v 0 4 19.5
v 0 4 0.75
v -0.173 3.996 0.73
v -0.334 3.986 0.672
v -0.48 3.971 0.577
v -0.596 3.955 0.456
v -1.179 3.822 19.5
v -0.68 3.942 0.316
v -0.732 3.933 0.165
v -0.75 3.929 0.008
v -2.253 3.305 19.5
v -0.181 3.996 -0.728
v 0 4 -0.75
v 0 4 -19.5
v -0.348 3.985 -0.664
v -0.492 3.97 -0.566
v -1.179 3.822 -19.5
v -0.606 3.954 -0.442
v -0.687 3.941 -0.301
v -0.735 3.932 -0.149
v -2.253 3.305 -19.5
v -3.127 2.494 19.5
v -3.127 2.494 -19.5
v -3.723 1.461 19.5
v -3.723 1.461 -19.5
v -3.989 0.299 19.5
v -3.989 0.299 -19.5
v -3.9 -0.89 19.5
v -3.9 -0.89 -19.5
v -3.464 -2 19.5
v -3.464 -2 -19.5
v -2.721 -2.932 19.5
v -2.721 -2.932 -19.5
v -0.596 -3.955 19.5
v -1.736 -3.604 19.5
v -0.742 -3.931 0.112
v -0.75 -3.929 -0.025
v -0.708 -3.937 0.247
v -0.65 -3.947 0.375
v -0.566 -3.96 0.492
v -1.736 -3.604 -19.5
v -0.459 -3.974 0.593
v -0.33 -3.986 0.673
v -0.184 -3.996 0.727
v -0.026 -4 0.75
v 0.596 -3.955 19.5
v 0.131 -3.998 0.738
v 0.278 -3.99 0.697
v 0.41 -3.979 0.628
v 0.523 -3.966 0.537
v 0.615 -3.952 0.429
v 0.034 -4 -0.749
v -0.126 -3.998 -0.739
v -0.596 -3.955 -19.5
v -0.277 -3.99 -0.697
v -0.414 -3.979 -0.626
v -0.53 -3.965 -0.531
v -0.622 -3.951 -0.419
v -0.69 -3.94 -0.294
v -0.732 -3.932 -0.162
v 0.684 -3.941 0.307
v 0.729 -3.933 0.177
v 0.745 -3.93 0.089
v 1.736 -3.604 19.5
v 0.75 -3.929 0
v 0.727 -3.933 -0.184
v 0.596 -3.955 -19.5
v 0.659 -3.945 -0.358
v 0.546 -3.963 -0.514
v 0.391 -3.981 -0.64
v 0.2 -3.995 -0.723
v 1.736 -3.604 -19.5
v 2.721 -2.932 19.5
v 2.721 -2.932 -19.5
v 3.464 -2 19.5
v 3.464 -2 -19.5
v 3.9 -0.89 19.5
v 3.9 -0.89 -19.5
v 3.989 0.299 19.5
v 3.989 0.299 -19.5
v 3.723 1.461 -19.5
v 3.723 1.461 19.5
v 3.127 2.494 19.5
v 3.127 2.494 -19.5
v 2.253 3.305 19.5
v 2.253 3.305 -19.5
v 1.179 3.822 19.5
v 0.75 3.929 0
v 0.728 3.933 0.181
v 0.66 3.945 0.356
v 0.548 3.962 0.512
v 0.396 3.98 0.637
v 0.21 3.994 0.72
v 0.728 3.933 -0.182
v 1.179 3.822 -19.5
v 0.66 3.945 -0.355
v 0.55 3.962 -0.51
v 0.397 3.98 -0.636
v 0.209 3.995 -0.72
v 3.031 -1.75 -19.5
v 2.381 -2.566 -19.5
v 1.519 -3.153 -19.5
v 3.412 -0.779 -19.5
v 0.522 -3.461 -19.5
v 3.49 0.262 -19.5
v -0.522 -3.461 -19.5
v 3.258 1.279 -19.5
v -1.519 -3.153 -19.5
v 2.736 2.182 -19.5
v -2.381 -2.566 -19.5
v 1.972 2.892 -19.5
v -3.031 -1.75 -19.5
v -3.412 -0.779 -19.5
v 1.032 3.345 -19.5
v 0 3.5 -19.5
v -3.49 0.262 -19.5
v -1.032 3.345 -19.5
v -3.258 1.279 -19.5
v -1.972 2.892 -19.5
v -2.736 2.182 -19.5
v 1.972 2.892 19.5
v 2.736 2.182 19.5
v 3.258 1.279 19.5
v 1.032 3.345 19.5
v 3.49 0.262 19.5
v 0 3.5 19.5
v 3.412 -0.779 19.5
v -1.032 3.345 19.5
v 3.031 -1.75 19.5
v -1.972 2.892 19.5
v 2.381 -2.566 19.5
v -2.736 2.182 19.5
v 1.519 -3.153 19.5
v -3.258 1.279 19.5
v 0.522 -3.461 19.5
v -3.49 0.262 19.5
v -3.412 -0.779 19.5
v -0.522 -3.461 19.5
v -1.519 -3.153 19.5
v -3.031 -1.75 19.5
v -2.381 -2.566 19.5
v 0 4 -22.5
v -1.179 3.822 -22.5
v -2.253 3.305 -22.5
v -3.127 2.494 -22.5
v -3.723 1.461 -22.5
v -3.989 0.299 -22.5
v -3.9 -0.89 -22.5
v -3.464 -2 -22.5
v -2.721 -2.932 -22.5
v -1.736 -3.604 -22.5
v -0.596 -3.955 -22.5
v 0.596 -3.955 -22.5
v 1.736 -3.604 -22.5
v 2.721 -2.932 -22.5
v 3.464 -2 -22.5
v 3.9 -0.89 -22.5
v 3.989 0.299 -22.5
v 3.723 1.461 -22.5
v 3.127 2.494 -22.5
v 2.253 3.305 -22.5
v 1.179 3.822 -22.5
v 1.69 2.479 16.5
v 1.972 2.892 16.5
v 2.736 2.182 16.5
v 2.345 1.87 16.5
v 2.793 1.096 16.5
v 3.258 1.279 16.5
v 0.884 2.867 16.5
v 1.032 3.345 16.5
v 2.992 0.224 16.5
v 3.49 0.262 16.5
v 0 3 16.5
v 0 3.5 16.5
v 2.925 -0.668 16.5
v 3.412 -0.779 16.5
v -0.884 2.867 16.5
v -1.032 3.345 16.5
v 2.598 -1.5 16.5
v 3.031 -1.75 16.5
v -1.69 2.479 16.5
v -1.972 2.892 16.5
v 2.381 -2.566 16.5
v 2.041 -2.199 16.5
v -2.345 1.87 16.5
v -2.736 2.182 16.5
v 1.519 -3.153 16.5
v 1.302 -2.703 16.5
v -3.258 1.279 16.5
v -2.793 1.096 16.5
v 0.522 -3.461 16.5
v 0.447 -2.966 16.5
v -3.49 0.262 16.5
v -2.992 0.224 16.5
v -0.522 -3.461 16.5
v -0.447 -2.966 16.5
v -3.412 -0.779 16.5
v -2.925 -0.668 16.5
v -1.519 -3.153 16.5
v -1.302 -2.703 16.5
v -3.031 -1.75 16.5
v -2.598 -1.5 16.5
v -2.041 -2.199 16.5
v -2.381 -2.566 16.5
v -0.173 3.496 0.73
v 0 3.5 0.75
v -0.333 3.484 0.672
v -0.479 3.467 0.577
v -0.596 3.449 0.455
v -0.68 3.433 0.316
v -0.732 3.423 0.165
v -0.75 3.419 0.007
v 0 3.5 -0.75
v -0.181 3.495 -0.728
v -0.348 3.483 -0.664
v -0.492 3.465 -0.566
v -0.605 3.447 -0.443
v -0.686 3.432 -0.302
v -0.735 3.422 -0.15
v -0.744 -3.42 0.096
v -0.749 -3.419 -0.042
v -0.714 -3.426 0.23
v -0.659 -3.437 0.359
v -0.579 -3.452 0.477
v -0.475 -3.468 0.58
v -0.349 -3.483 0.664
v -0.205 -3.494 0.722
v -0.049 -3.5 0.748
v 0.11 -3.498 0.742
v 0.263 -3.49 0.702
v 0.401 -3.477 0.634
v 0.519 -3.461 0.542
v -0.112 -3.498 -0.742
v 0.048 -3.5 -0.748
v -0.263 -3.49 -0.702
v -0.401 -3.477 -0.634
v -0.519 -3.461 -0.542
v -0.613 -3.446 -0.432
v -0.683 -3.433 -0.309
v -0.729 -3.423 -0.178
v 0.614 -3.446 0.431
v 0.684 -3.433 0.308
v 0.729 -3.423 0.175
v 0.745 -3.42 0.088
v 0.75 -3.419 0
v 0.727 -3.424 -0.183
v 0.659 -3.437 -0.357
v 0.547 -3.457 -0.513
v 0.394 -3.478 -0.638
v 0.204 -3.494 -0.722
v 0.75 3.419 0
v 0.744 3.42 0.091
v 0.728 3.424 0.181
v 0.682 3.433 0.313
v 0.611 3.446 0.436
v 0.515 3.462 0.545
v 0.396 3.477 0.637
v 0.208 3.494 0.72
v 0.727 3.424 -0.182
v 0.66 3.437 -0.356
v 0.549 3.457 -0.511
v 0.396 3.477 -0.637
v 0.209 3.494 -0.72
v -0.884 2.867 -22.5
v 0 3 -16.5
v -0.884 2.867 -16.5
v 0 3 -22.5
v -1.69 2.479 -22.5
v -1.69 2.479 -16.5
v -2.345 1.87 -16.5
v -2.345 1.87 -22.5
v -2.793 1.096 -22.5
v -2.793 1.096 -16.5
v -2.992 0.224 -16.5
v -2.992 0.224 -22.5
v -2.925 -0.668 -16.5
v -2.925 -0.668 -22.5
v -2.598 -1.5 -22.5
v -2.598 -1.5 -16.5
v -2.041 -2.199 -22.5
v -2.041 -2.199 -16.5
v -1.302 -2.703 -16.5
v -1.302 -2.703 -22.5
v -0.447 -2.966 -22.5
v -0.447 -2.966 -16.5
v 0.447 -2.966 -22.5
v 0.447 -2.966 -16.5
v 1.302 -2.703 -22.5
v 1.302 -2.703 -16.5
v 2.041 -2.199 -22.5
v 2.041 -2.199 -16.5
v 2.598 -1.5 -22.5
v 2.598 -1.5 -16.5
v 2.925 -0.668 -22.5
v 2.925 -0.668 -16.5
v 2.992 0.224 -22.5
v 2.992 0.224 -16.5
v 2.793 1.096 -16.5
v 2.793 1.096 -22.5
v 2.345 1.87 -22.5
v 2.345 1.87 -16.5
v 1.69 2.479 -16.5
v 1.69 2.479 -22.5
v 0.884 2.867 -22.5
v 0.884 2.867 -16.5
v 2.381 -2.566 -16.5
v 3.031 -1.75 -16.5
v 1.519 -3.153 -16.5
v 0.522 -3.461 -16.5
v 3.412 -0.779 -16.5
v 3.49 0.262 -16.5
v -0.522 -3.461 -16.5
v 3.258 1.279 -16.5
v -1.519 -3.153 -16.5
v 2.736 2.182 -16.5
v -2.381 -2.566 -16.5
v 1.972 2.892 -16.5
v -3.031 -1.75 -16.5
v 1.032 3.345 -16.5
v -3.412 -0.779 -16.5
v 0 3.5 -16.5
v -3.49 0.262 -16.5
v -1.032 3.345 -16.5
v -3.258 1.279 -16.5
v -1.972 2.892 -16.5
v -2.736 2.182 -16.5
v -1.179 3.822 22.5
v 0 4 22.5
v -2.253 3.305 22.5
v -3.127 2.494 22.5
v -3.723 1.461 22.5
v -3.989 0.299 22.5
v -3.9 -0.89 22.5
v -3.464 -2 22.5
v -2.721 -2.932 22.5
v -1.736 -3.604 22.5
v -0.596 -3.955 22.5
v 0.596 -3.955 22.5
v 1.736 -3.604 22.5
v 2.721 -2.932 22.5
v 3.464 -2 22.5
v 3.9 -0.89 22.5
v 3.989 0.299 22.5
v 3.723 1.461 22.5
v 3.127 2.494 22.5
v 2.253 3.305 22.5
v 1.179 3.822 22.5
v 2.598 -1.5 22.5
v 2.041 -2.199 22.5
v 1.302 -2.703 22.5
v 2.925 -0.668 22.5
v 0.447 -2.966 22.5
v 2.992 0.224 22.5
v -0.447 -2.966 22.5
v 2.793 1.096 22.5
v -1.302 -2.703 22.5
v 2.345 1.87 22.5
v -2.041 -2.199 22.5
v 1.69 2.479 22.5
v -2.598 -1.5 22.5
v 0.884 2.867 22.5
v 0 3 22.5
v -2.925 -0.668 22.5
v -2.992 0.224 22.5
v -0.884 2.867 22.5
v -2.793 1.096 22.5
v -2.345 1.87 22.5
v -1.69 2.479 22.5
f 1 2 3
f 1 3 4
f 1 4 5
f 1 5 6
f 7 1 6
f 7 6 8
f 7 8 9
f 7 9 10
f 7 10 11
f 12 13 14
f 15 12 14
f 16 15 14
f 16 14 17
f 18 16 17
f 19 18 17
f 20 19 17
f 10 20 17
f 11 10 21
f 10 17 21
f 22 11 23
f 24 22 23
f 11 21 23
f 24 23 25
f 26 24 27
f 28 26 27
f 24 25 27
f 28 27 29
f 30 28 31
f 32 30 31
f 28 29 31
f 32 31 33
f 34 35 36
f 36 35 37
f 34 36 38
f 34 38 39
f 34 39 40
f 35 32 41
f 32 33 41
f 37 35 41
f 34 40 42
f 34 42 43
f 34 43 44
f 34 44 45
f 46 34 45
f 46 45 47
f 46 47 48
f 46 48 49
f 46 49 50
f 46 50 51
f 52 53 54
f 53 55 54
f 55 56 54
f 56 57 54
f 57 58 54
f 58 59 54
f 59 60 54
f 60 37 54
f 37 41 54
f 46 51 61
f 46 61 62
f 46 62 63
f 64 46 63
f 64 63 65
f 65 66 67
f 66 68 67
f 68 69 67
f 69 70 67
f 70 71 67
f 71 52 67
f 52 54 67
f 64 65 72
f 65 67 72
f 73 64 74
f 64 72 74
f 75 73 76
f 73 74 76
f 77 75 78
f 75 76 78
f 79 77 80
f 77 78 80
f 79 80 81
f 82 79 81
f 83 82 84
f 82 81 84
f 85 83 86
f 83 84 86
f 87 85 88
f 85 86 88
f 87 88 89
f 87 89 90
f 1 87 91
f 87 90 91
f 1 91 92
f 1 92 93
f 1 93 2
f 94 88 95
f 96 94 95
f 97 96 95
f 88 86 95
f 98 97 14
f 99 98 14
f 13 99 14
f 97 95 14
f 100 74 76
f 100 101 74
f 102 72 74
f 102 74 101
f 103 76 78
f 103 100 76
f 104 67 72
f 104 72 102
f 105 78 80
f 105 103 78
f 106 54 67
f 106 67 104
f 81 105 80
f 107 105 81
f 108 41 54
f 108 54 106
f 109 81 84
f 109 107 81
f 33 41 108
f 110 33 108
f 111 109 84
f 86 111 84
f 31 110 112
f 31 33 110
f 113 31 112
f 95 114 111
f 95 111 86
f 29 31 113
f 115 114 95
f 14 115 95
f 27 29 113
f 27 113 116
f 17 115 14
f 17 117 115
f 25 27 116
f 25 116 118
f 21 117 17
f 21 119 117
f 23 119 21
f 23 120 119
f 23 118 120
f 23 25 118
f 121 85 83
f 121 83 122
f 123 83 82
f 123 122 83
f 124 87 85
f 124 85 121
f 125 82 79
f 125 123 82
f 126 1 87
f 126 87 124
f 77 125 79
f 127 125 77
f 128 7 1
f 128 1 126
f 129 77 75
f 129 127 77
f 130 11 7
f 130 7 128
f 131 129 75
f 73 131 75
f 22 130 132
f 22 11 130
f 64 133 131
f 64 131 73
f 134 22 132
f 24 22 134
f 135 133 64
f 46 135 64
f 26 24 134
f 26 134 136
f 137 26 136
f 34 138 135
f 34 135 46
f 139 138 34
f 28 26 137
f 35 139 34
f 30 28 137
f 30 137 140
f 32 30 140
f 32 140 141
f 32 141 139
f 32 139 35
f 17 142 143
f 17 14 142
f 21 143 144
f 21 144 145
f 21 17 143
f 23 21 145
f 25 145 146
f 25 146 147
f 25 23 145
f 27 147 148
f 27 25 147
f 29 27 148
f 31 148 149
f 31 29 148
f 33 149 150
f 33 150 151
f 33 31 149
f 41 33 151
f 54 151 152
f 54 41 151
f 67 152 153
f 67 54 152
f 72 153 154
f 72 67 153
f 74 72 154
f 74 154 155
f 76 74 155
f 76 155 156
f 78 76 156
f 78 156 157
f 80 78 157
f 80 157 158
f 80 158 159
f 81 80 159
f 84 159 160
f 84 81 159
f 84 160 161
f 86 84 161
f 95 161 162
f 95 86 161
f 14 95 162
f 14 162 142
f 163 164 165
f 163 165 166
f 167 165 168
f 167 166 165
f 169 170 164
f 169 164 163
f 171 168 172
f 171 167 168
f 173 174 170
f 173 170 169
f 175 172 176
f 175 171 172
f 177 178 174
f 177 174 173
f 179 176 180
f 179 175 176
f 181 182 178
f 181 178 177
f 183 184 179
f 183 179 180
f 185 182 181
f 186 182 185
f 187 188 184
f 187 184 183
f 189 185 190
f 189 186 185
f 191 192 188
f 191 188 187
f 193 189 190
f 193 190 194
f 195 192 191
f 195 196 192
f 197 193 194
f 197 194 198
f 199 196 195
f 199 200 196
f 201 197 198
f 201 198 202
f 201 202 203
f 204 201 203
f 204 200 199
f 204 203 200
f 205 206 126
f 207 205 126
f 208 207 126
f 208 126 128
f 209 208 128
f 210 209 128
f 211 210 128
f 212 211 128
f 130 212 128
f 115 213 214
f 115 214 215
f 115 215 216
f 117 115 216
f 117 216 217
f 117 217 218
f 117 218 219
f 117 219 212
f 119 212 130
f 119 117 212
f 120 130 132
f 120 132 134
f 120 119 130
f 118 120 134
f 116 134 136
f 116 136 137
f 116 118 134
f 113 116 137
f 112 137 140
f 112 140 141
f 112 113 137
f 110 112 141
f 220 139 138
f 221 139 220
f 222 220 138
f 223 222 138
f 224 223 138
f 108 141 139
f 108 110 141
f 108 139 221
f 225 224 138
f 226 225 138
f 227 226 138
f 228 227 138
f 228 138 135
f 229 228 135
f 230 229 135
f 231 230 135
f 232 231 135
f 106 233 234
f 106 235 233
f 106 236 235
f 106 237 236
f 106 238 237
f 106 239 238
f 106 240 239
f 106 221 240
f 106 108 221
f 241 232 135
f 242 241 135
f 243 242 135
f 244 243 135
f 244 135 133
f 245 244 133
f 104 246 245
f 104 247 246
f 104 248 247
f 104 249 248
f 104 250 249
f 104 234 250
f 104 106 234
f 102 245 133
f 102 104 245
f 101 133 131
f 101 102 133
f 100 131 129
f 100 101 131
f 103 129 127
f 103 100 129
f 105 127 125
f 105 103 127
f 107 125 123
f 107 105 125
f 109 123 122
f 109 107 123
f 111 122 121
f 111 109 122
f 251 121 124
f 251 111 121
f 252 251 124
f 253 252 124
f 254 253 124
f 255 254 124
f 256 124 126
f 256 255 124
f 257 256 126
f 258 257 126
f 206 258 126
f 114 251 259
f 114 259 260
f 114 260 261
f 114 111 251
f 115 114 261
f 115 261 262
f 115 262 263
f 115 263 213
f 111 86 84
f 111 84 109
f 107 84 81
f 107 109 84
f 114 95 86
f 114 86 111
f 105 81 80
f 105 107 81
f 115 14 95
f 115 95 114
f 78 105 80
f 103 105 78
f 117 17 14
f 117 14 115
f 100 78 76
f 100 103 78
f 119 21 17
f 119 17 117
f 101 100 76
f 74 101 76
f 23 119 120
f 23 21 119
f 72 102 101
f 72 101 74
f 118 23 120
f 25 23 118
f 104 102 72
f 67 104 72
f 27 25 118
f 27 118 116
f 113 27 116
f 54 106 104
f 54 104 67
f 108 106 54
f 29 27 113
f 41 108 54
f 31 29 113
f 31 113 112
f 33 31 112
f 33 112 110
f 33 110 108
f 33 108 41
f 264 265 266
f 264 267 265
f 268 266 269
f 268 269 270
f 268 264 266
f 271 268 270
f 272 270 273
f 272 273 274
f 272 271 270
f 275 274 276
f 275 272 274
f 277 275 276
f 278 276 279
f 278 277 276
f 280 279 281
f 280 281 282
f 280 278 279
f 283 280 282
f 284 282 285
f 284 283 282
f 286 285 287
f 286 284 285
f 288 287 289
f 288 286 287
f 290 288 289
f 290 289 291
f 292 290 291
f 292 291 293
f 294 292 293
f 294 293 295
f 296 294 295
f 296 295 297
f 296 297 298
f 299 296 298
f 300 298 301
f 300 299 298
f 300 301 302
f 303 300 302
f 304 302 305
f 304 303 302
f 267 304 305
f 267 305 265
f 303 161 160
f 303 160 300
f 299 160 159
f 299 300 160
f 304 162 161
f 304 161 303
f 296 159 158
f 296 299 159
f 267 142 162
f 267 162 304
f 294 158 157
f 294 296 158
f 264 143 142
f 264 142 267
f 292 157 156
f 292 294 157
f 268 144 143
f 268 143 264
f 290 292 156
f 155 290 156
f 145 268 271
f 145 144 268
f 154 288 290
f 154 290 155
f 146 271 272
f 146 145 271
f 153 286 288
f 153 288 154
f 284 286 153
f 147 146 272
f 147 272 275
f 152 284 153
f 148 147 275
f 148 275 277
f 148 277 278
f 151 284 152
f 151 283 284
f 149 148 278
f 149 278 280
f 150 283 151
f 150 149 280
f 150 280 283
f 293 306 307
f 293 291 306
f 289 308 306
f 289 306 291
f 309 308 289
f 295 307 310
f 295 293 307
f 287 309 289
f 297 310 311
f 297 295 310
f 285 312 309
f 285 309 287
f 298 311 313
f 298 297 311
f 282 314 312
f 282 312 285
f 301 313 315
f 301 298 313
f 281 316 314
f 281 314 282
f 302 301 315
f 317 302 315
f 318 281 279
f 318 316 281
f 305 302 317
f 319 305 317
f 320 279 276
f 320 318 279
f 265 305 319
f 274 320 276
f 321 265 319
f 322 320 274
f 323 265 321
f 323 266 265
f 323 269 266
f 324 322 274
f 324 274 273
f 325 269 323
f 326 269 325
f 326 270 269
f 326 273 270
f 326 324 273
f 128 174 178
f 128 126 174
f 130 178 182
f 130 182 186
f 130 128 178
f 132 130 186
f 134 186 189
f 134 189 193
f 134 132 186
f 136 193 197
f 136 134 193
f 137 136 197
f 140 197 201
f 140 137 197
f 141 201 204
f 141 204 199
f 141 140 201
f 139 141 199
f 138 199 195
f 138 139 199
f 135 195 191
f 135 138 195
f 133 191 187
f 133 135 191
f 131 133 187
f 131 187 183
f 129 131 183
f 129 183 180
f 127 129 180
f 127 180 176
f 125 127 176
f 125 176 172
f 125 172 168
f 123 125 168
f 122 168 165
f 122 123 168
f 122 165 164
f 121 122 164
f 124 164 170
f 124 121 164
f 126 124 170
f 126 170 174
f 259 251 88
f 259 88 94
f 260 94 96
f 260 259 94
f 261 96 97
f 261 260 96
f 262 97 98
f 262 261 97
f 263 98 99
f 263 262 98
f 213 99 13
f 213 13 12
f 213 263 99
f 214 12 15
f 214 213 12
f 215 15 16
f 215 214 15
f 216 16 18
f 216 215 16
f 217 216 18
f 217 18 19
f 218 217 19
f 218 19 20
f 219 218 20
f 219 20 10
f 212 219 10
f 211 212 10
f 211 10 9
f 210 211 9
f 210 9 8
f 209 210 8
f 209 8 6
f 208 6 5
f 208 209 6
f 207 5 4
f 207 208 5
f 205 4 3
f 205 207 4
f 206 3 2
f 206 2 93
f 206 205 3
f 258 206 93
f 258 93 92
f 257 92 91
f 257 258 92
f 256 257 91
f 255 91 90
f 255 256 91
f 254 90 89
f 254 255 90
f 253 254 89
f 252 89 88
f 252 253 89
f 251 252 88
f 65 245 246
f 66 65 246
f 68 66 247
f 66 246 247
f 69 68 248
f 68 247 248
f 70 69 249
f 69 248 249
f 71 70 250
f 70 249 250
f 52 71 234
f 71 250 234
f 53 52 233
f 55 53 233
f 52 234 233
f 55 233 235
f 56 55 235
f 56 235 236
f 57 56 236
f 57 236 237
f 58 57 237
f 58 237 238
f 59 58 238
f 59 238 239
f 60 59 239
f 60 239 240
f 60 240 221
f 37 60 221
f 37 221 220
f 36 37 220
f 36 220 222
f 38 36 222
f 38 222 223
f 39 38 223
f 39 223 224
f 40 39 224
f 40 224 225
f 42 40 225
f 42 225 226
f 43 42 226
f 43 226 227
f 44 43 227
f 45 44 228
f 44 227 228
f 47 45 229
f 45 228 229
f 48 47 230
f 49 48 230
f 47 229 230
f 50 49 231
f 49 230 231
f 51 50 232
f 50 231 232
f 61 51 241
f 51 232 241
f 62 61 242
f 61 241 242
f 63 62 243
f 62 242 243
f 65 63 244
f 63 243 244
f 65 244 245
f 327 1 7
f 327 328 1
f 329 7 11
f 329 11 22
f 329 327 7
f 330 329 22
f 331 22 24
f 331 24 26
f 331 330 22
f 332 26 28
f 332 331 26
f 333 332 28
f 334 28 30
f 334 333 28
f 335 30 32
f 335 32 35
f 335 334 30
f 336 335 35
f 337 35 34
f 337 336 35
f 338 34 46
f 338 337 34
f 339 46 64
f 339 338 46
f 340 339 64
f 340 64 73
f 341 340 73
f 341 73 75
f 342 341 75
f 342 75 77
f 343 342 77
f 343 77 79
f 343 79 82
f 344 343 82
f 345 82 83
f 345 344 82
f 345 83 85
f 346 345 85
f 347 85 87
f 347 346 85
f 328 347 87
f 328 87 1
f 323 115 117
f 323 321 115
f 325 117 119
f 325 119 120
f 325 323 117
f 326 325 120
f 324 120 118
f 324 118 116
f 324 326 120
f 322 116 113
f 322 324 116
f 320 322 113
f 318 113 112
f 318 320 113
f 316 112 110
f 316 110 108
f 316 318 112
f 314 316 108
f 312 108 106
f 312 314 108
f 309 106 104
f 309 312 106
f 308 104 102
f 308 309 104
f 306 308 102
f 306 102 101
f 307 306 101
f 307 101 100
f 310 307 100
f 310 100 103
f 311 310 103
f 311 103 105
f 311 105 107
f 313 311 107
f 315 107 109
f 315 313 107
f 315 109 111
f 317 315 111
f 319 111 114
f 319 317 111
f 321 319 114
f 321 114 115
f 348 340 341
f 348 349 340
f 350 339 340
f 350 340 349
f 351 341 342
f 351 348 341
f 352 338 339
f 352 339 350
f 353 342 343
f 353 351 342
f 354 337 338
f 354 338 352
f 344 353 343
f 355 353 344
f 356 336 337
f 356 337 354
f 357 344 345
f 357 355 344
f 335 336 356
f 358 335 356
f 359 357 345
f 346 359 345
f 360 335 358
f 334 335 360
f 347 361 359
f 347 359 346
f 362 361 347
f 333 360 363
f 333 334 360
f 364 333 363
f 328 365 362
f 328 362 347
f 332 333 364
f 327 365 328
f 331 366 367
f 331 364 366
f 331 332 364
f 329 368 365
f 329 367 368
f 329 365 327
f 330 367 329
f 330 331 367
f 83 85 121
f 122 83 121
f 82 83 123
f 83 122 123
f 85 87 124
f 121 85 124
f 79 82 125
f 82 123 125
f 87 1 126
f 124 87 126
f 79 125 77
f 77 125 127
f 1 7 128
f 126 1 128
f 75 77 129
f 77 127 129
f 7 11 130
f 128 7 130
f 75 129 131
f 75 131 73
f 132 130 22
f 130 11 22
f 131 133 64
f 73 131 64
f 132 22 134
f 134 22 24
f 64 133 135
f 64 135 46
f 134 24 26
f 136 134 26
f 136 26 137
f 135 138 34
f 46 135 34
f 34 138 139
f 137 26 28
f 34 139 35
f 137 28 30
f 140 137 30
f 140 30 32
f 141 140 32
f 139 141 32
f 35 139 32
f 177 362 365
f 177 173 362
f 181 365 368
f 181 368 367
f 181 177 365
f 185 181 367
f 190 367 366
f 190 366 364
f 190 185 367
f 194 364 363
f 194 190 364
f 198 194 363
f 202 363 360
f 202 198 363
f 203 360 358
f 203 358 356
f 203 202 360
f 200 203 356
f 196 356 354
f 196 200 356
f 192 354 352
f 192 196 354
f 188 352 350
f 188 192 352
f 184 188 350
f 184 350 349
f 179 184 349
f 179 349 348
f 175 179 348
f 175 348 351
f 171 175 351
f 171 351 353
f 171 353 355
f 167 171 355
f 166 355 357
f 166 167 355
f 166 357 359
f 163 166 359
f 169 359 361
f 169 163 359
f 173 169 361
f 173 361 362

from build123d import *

# Parameters (mm, degrees)
SKIZZE1_W                            = 39
SKIZZE1_H                            = 0.5
SKIZZE2_R                            = 0.75
SCHNITT_LINEAR_AUSTRAGEN1_DEPTH      = 5
SCHNITT_LINEAR_AUSTRAGEN1_DEPTH_BACK = 5


with BuildPart() as part:
    # Skizze1 → Rotation1 (revolve)
    with BuildSketch(Plane(origin=(0, 0, 0), x_dir=(0, 0, -1), z_dir=(1, 0, 0))):
        with Locations((0, 3.75)):
            Rectangle(SKIZZE1_W, SKIZZE1_H)
    revolve(axis=Axis((0, 0, 0), (0, 0, 1)))

    # Skizze2 → Schnitt-Linear austragen1 (cut, two sides)
    with BuildSketch(Plane(origin=(0, 0, 0), x_dir=(1, 0, 0), z_dir=(0, 1, 0))) as schnitt_linear_austragen1_sk:
        Circle(SKIZZE2_R)
    extrude(amount=SCHNITT_LINEAR_AUSTRAGEN1_DEPTH, mode=Mode.SUBTRACT)
    extrude(schnitt_linear_austragen1_sk.sketch, amount=-SCHNITT_LINEAR_AUSTRAGEN1_DEPTH_BACK, mode=Mode.SUBTRACT)


with BuildPart() as body_2:
    # Skizze1_3 → Rotation3 (revolve)
    with BuildSketch(Plane(origin=(0, 0, 0), x_dir=(0, 0, -1), z_dir=(1, 0, 0))):
        Polygon((-16.5, 3.5), (-19.5, 3.5), (-19.5, 4), (-22.5, 4), (-22.5, 3), (-16.5, 3), align=None)
        Polygon((19.5, 3.5), (16.5, 3.5), (16.5, 3), (22.5, 3), (22.5, 4), (19.5, 4), align=None)
    revolve(axis=Axis((0, 0, 0), (0, 0, 1)))


solid = Compound([part.part, body_2.part])
